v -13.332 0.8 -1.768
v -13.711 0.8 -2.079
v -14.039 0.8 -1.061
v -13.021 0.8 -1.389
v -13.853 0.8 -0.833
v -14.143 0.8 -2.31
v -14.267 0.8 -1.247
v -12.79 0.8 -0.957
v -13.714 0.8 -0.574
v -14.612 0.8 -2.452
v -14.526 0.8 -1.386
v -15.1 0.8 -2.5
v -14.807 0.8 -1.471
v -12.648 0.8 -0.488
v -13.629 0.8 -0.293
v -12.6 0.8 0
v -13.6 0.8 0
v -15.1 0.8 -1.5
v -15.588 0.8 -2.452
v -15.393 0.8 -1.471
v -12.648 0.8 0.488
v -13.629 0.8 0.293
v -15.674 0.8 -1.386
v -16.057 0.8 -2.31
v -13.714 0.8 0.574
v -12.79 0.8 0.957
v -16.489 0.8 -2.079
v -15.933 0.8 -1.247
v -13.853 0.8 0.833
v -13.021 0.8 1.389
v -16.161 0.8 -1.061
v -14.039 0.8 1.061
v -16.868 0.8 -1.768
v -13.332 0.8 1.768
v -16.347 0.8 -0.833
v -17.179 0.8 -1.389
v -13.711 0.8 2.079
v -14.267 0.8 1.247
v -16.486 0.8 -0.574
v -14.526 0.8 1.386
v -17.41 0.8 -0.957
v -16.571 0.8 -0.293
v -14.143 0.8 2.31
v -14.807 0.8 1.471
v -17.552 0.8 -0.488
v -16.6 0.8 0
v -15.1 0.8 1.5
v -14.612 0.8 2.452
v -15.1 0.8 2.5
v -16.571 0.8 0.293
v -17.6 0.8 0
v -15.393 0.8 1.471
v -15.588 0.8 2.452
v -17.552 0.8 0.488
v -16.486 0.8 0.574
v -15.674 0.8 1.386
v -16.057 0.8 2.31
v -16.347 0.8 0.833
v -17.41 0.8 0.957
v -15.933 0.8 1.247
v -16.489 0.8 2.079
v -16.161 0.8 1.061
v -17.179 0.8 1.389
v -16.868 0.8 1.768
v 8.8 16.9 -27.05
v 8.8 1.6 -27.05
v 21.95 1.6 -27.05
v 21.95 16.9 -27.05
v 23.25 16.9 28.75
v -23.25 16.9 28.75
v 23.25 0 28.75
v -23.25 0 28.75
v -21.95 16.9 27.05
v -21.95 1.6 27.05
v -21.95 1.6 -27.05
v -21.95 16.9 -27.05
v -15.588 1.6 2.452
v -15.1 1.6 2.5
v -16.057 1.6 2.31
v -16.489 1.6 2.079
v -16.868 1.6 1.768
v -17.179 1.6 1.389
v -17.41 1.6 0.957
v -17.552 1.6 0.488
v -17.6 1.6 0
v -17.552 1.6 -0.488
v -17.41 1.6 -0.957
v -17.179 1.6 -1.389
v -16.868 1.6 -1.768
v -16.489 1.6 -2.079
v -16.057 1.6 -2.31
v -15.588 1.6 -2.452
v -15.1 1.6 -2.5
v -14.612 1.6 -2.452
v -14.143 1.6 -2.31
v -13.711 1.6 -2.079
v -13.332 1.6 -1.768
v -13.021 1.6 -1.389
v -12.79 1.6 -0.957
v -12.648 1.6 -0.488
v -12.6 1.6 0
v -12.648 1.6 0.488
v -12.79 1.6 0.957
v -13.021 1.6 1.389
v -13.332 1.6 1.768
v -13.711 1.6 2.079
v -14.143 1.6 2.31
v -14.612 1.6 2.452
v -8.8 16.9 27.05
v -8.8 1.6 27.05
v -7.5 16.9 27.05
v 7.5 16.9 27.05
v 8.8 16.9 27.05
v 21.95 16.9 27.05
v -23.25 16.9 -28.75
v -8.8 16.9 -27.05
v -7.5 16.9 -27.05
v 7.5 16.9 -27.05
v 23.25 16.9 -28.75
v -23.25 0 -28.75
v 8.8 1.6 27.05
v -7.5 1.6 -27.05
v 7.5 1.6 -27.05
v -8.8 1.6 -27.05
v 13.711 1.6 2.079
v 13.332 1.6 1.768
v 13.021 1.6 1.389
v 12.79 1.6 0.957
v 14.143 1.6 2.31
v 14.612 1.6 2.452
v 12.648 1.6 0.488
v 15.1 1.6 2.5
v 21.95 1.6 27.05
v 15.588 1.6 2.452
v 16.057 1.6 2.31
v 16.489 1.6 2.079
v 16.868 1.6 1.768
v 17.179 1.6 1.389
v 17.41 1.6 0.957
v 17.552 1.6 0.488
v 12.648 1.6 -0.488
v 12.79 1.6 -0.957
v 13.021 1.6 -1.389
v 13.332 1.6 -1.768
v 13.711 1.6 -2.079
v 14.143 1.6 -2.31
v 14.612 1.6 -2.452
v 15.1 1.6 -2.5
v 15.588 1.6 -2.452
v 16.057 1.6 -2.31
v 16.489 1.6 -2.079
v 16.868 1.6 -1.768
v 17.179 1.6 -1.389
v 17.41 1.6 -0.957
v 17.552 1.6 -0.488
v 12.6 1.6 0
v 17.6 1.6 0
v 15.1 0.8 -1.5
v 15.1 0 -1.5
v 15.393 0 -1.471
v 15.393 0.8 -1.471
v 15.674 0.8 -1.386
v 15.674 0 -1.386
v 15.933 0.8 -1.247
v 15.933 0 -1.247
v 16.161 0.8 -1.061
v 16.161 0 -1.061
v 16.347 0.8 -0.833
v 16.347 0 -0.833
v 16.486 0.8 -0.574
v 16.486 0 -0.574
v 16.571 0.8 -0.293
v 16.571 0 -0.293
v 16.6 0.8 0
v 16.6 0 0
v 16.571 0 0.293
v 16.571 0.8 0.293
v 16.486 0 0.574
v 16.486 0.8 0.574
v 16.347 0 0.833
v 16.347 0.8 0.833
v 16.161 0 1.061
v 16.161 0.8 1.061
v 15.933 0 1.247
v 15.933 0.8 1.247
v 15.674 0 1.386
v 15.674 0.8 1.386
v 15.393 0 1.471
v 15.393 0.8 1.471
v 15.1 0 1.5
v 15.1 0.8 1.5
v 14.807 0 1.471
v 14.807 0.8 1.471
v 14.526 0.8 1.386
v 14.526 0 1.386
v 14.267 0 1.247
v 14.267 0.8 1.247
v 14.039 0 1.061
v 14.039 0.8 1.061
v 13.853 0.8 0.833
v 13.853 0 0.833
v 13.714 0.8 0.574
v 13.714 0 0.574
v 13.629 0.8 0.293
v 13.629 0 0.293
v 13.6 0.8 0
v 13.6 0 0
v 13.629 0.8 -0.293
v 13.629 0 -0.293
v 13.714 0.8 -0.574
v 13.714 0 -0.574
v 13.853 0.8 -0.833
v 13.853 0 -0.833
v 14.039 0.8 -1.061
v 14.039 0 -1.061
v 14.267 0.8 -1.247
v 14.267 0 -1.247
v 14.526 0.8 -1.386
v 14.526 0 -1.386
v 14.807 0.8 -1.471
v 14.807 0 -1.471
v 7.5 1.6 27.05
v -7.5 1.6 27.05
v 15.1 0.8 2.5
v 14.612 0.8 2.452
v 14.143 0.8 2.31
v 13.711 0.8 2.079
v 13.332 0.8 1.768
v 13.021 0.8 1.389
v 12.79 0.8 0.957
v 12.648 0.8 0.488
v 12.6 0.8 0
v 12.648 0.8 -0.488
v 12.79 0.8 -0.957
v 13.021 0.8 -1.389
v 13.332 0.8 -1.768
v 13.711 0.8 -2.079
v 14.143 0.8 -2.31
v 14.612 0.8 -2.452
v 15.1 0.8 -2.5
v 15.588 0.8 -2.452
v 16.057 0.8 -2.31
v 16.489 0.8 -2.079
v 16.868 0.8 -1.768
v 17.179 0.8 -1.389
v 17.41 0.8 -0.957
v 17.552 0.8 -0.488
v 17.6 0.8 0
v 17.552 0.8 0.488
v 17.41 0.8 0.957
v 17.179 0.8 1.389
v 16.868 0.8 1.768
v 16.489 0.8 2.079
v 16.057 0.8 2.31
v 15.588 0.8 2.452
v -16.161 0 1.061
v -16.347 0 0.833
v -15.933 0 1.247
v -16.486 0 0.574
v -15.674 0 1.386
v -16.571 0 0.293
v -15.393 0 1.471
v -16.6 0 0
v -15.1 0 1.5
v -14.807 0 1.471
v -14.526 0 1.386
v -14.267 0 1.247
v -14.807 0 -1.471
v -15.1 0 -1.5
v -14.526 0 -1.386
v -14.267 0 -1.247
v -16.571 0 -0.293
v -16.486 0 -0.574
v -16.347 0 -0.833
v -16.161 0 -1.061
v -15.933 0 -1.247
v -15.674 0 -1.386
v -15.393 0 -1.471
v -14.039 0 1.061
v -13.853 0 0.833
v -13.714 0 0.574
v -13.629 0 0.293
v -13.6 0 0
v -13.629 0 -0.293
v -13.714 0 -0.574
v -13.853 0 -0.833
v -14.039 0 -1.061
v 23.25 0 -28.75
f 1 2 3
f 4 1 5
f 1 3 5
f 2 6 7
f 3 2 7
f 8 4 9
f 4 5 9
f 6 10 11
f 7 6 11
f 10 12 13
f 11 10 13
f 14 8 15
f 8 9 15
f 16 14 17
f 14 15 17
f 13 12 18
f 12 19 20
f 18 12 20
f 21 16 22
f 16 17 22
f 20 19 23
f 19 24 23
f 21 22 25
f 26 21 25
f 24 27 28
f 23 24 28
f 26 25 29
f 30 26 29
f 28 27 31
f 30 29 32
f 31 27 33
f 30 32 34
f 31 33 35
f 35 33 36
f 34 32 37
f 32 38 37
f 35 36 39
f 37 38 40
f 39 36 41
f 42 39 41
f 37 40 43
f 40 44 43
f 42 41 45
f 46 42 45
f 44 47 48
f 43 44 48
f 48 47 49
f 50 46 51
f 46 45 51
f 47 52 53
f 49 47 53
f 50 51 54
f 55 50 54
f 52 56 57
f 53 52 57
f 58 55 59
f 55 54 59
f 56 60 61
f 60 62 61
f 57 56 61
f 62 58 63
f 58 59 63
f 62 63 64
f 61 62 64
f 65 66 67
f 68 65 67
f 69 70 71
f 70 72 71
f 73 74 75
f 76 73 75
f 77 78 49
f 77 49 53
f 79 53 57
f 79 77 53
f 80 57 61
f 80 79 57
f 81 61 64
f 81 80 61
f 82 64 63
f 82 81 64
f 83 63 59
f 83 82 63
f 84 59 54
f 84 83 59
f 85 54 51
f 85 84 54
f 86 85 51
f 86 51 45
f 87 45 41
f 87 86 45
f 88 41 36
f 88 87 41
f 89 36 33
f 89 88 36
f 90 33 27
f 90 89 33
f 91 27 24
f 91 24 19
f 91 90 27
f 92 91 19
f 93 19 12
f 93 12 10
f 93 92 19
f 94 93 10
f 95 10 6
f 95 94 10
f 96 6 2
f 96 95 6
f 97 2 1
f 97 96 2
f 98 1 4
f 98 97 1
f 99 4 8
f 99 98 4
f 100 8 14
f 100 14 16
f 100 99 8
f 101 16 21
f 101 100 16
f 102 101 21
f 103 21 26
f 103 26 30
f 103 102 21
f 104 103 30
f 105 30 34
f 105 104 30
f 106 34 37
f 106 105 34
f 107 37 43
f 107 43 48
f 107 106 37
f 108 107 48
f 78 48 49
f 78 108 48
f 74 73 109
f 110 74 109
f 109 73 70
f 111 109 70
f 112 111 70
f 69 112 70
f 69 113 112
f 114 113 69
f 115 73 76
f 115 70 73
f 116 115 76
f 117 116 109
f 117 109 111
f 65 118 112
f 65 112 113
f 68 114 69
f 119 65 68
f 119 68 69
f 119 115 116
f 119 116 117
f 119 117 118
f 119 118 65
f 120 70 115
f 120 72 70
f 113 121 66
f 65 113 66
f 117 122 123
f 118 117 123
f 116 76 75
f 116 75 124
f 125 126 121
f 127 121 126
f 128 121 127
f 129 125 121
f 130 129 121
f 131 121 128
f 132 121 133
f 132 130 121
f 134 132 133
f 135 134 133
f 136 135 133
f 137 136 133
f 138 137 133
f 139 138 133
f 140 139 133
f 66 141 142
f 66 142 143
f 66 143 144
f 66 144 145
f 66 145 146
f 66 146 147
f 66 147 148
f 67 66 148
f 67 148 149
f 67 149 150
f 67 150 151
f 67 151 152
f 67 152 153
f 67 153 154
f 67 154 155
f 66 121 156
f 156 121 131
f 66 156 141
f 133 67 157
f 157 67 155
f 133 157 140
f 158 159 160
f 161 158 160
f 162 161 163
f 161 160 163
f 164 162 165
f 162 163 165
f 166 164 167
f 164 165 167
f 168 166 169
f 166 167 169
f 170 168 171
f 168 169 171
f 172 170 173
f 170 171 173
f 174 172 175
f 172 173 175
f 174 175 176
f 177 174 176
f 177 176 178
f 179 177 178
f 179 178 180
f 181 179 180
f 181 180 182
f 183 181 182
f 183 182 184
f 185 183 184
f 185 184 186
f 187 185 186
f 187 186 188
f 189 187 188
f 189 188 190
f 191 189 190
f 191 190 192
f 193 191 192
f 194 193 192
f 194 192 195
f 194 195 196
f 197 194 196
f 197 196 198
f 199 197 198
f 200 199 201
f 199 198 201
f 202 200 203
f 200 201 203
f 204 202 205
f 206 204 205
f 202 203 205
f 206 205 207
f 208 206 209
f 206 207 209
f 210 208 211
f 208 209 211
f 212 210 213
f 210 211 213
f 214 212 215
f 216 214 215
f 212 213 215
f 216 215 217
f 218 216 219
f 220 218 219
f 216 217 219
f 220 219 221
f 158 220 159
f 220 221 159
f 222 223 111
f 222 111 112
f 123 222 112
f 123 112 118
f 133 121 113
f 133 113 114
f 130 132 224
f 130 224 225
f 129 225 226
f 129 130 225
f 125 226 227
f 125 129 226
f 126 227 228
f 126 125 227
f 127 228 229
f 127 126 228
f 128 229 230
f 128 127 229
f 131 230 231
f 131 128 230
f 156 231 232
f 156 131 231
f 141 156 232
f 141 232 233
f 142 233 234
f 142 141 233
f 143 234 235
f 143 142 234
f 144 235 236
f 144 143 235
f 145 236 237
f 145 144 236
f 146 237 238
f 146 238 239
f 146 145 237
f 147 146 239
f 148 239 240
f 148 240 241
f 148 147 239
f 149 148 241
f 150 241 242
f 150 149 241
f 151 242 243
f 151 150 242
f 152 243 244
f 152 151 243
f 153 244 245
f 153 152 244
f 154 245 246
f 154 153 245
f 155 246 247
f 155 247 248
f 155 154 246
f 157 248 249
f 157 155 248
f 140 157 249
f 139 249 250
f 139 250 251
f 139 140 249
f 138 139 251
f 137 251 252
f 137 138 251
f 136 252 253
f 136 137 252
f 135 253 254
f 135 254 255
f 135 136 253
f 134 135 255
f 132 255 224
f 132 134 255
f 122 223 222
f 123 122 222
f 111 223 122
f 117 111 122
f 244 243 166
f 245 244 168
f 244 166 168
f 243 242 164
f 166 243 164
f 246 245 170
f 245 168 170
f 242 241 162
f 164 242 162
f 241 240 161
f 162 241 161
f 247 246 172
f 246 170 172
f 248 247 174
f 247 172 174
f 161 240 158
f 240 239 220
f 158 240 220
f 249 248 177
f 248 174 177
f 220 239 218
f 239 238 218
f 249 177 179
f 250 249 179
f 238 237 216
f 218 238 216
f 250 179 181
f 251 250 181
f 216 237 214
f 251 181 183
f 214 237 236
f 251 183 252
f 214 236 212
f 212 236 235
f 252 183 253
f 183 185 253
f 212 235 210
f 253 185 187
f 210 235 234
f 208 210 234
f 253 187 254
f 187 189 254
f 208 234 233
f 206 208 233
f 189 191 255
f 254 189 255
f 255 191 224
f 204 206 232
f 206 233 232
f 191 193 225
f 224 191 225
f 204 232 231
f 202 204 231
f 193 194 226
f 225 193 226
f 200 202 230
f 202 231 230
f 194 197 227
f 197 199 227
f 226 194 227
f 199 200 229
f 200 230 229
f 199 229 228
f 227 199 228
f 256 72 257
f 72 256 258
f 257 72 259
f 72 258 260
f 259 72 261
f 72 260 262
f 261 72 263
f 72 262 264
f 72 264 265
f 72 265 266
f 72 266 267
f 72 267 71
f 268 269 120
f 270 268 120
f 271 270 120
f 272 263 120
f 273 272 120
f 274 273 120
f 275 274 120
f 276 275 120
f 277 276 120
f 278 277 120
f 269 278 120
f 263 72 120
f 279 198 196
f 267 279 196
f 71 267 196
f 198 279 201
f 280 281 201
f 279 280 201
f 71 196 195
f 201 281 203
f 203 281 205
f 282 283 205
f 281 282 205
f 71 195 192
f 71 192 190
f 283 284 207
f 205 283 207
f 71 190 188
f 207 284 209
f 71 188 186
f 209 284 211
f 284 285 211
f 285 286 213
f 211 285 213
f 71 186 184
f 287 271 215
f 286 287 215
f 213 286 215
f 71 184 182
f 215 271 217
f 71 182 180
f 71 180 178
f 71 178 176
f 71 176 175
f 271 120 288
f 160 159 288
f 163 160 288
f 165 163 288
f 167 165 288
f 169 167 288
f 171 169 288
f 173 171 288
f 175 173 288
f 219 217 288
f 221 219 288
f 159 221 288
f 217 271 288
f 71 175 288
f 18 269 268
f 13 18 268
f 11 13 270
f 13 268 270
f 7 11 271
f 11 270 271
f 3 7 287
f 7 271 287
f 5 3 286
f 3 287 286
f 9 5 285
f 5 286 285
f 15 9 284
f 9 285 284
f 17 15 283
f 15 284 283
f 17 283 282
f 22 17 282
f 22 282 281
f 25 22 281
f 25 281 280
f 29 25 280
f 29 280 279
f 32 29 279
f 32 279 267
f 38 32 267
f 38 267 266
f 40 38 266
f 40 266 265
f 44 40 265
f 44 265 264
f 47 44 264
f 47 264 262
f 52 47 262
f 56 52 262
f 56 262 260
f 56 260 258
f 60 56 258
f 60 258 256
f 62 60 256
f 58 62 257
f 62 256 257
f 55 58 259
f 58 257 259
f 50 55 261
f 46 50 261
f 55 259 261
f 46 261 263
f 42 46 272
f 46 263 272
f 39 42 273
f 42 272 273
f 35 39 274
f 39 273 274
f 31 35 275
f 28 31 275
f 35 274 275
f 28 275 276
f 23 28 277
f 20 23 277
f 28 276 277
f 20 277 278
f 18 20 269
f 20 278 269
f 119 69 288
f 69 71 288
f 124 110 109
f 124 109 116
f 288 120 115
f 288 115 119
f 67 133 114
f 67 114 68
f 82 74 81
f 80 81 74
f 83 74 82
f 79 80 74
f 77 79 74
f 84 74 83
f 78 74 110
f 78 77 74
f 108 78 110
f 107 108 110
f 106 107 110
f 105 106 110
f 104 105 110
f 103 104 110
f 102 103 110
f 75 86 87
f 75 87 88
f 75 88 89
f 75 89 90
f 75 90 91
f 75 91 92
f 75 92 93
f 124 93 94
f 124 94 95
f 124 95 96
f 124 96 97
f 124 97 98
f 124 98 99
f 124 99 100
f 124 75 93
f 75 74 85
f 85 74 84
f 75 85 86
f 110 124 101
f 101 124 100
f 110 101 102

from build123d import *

# Parameters (mm, degrees)
SKETCH_1_W          = 46.5
SKETCH_1_H          = 57.5
EXTRUDE_1_DEPTH     = 1.6
SKETCH_2_W          = 46.5
SKETCH_2_H          = 57.5
SKETCH_2_W_2        = 13.15
SKETCH_2_H_2        = 54.1
SKETCH_2_W_3        = 15
EXTRUDE_2_DEPTH     = 15.3
SKETCH_3_R          = 1.5
CUT_EXTRUDE_1_DEPTH = 41.653843607
CUT_EXTRUDE_START   = -1.6
SKETCH_3_3_R        = 2.5
CUT_EXTRUDE_2_DEPTH = 0.8


with BuildPart() as part:
    # 草图1 → 凸台-拉伸1 (new body)
    with BuildSketch(Plane(origin=(0, 0, 0), x_dir=(1, 0, 0), z_dir=(0, 1, 0))):
        Rectangle(SKETCH_1_W, SKETCH_1_H)
    extrude(amount=EXTRUDE_1_DEPTH)

    # 草图2 → 凸台-拉伸2 (add)
    with BuildSketch(Plane(origin=(0, 1.6, 0), x_dir=(1, 0, 0), z_dir=(0, 1, 0))):
        Rectangle(SKETCH_2_W, SKETCH_2_H)
        with Locations((-15.375, 0)):
            Rectangle(SKETCH_2_W_2, SKETCH_2_H_2, mode=Mode.SUBTRACT)
        Rectangle(SKETCH_2_W_3, SKETCH_2_H_2, mode=Mode.SUBTRACT)
        with Locations((15.375, 0)):
            Rectangle(SKETCH_2_W_2, SKETCH_2_H_2, mode=Mode.SUBTRACT)
    extrude(amount=EXTRUDE_2_DEPTH)

    # 草图3 → 切除-拉伸1 (cut, through all)
    with BuildSketch(Plane.XZ):
        with Locations(Location((-15.1, 0, 0), (0, 0, 270))):
            Circle(SKETCH_3_R)
        with Locations(Location((15.1, 0, 0), (0, 0, 270))):
            Circle(SKETCH_3_R)
    extrude(amount=-CUT_EXTRUDE_1_DEPTH, mode=Mode.SUBTRACT)

    # 草图3<3> → 切除-拉伸2 (cut)
    with BuildSketch(Plane.XZ.offset(CUT_EXTRUDE_START)):
        with Locations(Location((-15.1, 0, 0), (0, 0, 90))):
            Circle(SKETCH_3_3_R)
        with Locations(Location((15.1, 0, 0), (0, 0, 90))):
            Circle(SKETCH_3_3_R)
    extrude(amount=CUT_EXTRUDE_2_DEPTH, mode=Mode.SUBTRACT)


solid = part.part
